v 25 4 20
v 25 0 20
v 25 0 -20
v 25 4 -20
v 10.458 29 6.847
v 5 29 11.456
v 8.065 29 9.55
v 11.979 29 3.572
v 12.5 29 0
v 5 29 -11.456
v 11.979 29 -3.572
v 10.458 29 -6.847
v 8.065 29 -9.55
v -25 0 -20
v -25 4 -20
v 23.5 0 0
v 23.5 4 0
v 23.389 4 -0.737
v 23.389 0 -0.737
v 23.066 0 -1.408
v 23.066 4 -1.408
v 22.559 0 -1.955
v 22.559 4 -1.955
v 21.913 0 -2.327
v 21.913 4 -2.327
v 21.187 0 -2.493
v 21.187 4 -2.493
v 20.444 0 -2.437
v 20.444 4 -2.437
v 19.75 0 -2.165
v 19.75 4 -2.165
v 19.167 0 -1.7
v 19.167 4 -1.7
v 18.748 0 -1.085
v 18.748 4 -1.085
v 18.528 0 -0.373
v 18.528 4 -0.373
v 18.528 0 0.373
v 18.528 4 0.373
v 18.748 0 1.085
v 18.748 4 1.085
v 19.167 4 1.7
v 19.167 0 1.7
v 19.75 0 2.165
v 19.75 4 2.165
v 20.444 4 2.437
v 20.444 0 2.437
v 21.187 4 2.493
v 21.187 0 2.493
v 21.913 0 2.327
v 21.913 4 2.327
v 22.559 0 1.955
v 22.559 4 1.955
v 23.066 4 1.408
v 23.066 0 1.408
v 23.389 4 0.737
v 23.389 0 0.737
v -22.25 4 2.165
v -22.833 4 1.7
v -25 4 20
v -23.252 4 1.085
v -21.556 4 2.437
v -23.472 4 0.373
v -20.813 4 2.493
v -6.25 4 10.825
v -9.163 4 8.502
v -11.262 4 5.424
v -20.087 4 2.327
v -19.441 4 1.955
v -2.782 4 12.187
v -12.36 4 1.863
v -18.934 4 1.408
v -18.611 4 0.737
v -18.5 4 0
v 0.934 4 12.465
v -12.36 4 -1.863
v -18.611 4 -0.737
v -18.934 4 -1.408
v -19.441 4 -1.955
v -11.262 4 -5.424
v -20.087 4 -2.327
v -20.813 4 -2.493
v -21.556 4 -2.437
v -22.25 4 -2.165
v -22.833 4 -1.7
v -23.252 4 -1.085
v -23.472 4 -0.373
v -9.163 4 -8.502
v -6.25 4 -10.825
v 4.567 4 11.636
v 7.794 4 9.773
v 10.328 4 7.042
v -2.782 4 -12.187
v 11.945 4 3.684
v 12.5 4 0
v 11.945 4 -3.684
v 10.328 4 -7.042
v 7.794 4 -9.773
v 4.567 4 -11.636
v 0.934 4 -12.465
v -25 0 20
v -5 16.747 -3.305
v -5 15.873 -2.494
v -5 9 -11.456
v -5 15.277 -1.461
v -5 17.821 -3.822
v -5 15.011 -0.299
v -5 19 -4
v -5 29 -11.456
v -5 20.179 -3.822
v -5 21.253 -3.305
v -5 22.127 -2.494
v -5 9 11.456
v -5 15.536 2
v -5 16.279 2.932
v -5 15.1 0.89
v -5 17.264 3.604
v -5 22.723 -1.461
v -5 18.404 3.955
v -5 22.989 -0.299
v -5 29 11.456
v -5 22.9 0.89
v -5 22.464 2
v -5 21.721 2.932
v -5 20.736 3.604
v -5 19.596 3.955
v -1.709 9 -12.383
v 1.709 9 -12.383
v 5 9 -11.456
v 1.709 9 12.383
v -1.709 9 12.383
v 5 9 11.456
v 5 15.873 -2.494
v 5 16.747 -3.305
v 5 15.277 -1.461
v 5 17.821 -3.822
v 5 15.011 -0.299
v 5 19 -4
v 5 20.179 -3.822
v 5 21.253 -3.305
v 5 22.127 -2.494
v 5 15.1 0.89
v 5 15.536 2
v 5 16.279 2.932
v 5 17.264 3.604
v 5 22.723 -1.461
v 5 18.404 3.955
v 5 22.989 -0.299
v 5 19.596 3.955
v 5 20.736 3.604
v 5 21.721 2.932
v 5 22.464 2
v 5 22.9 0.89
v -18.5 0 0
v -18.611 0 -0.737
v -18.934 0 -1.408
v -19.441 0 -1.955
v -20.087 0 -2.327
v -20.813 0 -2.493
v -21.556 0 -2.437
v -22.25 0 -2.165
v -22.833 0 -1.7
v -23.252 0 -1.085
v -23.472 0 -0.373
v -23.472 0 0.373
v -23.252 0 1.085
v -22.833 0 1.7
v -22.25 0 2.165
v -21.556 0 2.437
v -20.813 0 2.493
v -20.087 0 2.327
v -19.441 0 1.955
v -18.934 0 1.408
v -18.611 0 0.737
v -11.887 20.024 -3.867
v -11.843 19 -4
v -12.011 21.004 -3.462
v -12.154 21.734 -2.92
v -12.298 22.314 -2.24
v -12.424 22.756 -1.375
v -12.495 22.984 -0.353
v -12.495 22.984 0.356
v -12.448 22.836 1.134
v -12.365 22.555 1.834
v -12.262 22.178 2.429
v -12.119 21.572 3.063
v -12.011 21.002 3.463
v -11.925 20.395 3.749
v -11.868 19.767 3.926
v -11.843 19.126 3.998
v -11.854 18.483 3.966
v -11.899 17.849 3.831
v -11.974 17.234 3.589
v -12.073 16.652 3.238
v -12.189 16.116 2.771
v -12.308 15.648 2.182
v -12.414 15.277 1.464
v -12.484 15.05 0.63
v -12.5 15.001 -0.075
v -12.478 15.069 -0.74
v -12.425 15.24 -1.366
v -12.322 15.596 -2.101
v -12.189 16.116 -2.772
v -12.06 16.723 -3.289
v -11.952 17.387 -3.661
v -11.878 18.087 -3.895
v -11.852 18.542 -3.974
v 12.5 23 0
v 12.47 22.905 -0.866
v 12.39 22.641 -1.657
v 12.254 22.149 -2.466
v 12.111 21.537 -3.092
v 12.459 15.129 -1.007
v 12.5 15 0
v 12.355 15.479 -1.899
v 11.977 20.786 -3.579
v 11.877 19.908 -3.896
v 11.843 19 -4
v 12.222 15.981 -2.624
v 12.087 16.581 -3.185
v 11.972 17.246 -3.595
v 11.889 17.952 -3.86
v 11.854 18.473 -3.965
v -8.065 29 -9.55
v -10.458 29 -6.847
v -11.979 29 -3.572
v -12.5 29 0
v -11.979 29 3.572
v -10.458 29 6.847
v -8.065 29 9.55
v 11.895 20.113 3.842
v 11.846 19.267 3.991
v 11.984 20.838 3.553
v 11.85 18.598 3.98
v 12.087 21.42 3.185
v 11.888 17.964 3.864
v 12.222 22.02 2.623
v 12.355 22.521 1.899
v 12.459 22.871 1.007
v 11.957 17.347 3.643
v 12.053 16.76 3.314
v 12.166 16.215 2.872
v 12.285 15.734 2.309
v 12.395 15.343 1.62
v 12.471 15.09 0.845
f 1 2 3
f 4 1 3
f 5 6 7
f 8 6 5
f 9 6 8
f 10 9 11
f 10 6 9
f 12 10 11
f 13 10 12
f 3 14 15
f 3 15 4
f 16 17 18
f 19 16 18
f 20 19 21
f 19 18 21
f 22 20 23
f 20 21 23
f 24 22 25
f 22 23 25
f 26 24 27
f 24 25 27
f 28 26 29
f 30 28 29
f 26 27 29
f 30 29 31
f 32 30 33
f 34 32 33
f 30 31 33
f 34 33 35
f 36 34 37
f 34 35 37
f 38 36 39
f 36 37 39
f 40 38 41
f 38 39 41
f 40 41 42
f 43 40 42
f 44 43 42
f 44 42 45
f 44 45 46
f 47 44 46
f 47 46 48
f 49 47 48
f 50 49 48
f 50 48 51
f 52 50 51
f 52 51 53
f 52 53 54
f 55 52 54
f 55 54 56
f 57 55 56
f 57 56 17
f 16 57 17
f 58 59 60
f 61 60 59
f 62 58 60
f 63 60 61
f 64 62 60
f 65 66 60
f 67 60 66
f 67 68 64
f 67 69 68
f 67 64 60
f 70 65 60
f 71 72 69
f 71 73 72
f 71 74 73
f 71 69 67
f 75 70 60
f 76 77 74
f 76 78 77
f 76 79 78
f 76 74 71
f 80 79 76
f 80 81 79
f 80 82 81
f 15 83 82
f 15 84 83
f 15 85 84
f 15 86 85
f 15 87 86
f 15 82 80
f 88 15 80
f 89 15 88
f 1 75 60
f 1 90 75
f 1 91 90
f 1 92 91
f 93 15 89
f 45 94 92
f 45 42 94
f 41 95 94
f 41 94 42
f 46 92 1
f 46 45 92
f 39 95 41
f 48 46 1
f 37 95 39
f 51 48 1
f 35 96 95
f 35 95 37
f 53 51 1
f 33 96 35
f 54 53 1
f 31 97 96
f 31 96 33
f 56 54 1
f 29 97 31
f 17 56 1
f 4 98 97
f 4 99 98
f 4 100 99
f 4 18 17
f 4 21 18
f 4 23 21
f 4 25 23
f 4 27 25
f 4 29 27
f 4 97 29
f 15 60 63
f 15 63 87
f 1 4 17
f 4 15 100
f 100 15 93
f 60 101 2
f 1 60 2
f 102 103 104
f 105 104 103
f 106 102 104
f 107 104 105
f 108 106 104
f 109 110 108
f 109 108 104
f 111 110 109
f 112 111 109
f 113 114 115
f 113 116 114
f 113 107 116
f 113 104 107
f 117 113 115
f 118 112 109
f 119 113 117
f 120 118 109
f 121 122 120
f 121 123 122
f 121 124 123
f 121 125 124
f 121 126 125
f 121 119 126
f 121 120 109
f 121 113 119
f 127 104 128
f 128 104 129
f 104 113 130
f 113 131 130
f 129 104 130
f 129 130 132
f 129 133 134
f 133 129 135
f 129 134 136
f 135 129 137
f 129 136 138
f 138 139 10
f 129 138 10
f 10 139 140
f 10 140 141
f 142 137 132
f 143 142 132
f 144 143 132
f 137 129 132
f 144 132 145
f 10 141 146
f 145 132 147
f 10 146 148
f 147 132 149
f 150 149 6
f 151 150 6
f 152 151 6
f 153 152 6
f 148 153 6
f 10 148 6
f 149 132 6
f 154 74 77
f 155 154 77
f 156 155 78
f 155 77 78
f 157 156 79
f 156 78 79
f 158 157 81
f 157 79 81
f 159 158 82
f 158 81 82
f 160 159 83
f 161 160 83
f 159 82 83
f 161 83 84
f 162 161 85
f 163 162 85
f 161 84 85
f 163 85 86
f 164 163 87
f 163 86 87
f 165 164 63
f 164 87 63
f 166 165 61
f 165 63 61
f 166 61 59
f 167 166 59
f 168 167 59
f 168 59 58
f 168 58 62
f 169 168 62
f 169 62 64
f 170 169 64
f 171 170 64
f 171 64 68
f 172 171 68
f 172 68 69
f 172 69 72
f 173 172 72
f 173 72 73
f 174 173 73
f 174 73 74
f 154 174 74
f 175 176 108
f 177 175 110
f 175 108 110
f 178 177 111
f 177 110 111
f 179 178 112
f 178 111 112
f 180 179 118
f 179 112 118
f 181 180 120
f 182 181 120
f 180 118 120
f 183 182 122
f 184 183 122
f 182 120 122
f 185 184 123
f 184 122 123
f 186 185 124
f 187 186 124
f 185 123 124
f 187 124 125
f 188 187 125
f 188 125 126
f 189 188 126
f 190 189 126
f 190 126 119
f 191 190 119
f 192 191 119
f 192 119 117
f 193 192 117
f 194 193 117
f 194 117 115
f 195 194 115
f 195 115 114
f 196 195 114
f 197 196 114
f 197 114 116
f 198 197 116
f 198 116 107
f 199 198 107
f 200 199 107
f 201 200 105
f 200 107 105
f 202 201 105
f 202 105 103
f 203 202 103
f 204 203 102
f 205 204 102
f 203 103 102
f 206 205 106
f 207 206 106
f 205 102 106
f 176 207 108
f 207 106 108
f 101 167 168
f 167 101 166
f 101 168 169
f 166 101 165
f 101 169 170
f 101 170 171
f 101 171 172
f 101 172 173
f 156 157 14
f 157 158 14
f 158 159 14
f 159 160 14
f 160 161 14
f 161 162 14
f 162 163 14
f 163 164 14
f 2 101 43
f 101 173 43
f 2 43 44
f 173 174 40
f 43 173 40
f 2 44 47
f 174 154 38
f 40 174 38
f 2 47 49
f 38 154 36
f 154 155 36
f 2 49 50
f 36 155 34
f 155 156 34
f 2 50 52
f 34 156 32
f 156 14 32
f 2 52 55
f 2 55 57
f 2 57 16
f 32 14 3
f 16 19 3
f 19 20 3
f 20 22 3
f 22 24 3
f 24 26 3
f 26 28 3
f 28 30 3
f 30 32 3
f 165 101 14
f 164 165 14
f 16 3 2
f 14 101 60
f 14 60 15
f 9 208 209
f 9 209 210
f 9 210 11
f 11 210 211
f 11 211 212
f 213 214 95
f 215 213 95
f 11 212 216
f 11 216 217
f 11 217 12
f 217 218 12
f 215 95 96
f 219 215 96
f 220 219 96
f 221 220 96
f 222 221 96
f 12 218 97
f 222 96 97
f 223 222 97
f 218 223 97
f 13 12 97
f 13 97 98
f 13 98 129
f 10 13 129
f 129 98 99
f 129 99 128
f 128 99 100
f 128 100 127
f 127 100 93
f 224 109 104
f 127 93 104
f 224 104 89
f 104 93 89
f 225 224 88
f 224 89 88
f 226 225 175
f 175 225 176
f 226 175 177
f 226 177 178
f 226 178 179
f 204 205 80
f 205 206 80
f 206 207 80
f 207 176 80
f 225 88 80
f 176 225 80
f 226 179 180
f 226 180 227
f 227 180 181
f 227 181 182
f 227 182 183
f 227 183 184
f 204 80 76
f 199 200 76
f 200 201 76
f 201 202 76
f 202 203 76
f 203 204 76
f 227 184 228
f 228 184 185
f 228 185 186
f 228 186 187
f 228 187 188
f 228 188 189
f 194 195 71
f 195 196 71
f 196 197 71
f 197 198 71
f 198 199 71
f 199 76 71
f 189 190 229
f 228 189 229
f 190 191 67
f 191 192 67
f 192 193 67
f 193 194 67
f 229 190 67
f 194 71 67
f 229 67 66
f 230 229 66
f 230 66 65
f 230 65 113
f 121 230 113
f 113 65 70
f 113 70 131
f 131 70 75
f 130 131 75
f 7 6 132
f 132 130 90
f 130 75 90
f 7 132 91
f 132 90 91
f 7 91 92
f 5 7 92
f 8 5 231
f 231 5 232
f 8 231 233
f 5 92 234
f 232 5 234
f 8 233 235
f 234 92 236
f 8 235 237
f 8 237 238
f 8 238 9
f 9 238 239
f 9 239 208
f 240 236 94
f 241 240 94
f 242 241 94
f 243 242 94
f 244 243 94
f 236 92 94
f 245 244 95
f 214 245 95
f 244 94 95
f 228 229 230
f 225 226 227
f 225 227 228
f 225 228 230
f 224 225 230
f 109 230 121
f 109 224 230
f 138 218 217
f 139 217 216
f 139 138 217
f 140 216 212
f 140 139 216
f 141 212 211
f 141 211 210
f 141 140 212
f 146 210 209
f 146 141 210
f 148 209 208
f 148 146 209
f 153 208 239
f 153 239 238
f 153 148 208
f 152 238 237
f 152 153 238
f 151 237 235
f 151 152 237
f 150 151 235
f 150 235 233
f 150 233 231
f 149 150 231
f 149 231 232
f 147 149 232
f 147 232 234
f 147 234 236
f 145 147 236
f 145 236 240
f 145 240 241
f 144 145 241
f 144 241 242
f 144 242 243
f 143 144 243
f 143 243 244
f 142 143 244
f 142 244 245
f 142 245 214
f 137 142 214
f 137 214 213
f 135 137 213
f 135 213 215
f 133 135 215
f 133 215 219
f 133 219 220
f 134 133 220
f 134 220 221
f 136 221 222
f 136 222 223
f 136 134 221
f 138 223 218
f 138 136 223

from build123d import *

# Parameters (mm, degrees)
SKETCH_1_W               = 50
SKETCH_1_H               = 40
EXTRUDE_1_DEPTH          = 4
SKETCH_2_R               = 12.5
EXTRUDE_2_DEPTH          = 25
SKETCH_3_W               = 10
SKETCH_3_H               = 20
CUT_EXTRUDE_1_DEPTH      = 20
SKETCH_4_R               = 4
CUT_EXTRUDE_2_DEPTH      = 26
CUT_EXTRUDE_2_DEPTH_BACK = 26
SKETCH_5_R               = 2.5
CUT_EXTRUDE_3_DEPTH      = 10


with BuildPart() as part:
    # 草图1 → 凸台-拉伸1 (new body)
    with BuildSketch(Plane(origin=(0, 0, 0), x_dir=(1, 0, 0), z_dir=(0, 1, 0))):
        Rectangle(SKETCH_1_W, SKETCH_1_H)
    extrude(amount=EXTRUDE_1_DEPTH)

    # 草图2 → 凸台-拉伸2 (add)
    with BuildSketch(Plane(origin=(0, 4, 0), x_dir=(1, 0, 0), z_dir=(0, 1, 0))):
        Circle(SKETCH_2_R)
    extrude(amount=EXTRUDE_2_DEPTH)

    # 草图3 → 切除-拉伸1 (cut, symmetric)
    with BuildSketch(Plane.XY):
        with Locations((0, 19)):
            Rectangle(SKETCH_3_W, SKETCH_3_H)
    extrude(amount=CUT_EXTRUDE_1_DEPTH, both=True, mode=Mode.SUBTRACT)

    # 草图4 → 切除-拉伸2 (cut, two sides)
    with BuildSketch(Plane(origin=(0, 0, 0), x_dir=(0, 0, -1), z_dir=(1, 0, 0))) as cut_extrude_2_sk:
        with Locations((0, 19)):
            Circle(SKETCH_4_R)
    extrude(amount=CUT_EXTRUDE_2_DEPTH, mode=Mode.SUBTRACT)
    extrude(cut_extrude_2_sk.sketch, amount=-CUT_EXTRUDE_2_DEPTH_BACK, mode=Mode.SUBTRACT)

    # 草图5 → 切除-拉伸3 (cut)
    with BuildSketch(Plane(origin=(0, 4, 0), x_dir=(1, 0, 0), z_dir=(0, 1, 0))):
        with Locations((-21, 0)):
            Circle(SKETCH_5_R)
        with Locations((21, 0)):
            Circle(SKETCH_5_R)
    extrude(amount=-CUT_EXTRUDE_3_DEPTH, mode=Mode.SUBTRACT)


solid = part.part
